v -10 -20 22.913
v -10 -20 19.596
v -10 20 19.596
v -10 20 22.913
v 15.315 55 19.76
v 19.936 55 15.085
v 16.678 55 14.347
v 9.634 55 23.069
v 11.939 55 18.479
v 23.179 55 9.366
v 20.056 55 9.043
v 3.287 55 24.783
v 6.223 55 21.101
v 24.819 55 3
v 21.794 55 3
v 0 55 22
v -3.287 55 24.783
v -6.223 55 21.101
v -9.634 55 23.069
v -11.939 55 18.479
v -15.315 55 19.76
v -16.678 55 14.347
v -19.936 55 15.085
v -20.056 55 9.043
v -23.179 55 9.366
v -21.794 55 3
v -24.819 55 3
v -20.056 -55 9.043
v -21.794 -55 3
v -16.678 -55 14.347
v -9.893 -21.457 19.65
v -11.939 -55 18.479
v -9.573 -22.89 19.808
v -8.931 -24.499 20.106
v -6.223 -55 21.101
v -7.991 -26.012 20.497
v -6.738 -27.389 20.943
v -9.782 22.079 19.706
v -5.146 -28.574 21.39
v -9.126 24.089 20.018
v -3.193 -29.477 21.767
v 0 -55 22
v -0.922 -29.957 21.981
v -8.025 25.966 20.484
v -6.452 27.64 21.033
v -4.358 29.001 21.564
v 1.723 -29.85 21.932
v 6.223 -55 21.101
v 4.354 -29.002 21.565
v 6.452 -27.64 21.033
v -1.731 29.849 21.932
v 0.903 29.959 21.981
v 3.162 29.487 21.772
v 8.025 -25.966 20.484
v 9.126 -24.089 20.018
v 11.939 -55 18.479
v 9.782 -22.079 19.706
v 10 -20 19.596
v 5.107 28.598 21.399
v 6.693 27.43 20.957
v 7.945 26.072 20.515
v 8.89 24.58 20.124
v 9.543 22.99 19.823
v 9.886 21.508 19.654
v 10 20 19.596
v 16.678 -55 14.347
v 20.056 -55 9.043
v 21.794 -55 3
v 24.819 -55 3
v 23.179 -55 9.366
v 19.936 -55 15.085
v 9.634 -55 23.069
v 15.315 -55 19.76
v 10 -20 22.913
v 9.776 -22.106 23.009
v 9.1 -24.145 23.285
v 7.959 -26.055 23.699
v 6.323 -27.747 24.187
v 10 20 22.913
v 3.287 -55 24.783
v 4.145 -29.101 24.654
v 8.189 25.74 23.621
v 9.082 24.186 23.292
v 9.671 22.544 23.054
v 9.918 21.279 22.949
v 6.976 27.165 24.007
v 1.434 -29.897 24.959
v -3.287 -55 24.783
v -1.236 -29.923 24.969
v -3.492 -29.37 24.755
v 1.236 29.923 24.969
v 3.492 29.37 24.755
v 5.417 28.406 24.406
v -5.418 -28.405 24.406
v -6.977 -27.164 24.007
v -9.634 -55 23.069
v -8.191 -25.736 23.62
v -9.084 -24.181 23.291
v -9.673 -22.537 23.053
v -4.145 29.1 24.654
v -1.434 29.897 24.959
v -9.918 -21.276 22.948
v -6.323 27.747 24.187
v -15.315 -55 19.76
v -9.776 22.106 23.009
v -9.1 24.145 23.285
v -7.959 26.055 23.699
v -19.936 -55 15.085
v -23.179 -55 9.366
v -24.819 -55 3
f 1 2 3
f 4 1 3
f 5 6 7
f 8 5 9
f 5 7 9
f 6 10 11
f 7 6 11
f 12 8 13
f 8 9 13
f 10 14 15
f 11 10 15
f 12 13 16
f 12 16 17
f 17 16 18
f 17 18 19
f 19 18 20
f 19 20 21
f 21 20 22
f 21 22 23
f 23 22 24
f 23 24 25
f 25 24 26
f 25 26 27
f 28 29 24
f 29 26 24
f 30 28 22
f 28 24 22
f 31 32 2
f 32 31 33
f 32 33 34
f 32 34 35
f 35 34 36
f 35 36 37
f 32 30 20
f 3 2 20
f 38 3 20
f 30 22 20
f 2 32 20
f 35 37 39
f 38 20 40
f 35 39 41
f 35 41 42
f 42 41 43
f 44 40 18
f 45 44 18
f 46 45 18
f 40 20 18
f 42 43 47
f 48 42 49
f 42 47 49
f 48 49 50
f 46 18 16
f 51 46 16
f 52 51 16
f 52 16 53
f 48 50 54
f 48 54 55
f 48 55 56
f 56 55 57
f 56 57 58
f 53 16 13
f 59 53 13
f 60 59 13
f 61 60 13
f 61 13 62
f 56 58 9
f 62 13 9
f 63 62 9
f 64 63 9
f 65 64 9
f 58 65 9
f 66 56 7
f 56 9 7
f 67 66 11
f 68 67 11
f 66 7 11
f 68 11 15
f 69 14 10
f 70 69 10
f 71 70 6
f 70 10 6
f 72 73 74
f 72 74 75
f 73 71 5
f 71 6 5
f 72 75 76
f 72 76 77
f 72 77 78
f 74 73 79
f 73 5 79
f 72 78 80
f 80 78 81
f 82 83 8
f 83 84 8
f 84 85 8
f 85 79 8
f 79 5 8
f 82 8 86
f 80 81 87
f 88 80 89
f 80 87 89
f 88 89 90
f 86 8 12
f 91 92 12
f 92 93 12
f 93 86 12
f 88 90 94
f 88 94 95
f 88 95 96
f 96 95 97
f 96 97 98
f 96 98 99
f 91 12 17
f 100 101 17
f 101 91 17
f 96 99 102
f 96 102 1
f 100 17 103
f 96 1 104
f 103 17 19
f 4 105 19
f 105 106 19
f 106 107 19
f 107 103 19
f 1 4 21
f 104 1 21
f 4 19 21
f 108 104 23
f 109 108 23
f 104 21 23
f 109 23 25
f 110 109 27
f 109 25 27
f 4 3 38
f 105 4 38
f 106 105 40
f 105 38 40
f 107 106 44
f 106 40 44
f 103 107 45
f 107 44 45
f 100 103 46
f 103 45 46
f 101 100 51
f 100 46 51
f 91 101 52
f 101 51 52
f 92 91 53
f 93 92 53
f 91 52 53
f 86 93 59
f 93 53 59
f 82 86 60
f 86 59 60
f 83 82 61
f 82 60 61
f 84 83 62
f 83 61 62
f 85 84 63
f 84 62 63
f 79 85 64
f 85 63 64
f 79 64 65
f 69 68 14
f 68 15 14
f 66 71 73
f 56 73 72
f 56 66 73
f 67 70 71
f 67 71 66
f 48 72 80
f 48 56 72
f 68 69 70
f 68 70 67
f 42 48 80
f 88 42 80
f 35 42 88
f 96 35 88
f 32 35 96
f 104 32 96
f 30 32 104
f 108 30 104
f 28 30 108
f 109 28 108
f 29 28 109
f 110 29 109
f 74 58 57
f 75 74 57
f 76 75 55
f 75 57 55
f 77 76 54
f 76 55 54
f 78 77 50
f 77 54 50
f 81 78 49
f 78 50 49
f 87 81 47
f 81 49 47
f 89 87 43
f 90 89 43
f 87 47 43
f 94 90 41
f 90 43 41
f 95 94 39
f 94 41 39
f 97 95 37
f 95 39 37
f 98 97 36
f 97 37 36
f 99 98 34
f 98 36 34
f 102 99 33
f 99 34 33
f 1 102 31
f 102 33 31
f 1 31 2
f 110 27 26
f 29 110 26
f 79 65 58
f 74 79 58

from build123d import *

# Parameters (mm, degrees)
BOSS_EXTRUDE1_DEPTH = 55
CUT_EXTRUDE1_DEPTH  = 80


with BuildPart() as part:
    # Sketch1 → Boss-Extrude1 (new body, symmetric)
    with BuildSketch(Plane(origin=(0, 0, 0), x_dir=(1, 0, 0), z_dir=(0, 1, 0))):
        with BuildLine():
            Line((-24.819347292, -3), (-21.794494718, -3))
            ThreePointArc((-21.794494718, -3), (0, -22), (21.794494718, -3))
            Line((21.794494718, -3), (24.819347292, -3))
            ThreePointArc((24.819347292, -3), (0, -25), (-24.819347292, -3))
        make_face()
    extrude(amount=BOSS_EXTRUDE1_DEPTH, both=True)

    # Sketch2 → Cut-Extrude1 (cut)
    with BuildSketch(Plane.XY):
        with BuildLine():
            Line((-10, -20), (-10, 20))
            ThreePointArc((-10, 20), (0, 30), (10, 20))
            Line((10, 20), (10, -20))
            ThreePointArc((10, -20), (0, -30), (-10, -20))
        make_face()
    extrude(amount=CUT_EXTRUDE1_DEPTH, mode=Mode.SUBTRACT)


solid = part.part
